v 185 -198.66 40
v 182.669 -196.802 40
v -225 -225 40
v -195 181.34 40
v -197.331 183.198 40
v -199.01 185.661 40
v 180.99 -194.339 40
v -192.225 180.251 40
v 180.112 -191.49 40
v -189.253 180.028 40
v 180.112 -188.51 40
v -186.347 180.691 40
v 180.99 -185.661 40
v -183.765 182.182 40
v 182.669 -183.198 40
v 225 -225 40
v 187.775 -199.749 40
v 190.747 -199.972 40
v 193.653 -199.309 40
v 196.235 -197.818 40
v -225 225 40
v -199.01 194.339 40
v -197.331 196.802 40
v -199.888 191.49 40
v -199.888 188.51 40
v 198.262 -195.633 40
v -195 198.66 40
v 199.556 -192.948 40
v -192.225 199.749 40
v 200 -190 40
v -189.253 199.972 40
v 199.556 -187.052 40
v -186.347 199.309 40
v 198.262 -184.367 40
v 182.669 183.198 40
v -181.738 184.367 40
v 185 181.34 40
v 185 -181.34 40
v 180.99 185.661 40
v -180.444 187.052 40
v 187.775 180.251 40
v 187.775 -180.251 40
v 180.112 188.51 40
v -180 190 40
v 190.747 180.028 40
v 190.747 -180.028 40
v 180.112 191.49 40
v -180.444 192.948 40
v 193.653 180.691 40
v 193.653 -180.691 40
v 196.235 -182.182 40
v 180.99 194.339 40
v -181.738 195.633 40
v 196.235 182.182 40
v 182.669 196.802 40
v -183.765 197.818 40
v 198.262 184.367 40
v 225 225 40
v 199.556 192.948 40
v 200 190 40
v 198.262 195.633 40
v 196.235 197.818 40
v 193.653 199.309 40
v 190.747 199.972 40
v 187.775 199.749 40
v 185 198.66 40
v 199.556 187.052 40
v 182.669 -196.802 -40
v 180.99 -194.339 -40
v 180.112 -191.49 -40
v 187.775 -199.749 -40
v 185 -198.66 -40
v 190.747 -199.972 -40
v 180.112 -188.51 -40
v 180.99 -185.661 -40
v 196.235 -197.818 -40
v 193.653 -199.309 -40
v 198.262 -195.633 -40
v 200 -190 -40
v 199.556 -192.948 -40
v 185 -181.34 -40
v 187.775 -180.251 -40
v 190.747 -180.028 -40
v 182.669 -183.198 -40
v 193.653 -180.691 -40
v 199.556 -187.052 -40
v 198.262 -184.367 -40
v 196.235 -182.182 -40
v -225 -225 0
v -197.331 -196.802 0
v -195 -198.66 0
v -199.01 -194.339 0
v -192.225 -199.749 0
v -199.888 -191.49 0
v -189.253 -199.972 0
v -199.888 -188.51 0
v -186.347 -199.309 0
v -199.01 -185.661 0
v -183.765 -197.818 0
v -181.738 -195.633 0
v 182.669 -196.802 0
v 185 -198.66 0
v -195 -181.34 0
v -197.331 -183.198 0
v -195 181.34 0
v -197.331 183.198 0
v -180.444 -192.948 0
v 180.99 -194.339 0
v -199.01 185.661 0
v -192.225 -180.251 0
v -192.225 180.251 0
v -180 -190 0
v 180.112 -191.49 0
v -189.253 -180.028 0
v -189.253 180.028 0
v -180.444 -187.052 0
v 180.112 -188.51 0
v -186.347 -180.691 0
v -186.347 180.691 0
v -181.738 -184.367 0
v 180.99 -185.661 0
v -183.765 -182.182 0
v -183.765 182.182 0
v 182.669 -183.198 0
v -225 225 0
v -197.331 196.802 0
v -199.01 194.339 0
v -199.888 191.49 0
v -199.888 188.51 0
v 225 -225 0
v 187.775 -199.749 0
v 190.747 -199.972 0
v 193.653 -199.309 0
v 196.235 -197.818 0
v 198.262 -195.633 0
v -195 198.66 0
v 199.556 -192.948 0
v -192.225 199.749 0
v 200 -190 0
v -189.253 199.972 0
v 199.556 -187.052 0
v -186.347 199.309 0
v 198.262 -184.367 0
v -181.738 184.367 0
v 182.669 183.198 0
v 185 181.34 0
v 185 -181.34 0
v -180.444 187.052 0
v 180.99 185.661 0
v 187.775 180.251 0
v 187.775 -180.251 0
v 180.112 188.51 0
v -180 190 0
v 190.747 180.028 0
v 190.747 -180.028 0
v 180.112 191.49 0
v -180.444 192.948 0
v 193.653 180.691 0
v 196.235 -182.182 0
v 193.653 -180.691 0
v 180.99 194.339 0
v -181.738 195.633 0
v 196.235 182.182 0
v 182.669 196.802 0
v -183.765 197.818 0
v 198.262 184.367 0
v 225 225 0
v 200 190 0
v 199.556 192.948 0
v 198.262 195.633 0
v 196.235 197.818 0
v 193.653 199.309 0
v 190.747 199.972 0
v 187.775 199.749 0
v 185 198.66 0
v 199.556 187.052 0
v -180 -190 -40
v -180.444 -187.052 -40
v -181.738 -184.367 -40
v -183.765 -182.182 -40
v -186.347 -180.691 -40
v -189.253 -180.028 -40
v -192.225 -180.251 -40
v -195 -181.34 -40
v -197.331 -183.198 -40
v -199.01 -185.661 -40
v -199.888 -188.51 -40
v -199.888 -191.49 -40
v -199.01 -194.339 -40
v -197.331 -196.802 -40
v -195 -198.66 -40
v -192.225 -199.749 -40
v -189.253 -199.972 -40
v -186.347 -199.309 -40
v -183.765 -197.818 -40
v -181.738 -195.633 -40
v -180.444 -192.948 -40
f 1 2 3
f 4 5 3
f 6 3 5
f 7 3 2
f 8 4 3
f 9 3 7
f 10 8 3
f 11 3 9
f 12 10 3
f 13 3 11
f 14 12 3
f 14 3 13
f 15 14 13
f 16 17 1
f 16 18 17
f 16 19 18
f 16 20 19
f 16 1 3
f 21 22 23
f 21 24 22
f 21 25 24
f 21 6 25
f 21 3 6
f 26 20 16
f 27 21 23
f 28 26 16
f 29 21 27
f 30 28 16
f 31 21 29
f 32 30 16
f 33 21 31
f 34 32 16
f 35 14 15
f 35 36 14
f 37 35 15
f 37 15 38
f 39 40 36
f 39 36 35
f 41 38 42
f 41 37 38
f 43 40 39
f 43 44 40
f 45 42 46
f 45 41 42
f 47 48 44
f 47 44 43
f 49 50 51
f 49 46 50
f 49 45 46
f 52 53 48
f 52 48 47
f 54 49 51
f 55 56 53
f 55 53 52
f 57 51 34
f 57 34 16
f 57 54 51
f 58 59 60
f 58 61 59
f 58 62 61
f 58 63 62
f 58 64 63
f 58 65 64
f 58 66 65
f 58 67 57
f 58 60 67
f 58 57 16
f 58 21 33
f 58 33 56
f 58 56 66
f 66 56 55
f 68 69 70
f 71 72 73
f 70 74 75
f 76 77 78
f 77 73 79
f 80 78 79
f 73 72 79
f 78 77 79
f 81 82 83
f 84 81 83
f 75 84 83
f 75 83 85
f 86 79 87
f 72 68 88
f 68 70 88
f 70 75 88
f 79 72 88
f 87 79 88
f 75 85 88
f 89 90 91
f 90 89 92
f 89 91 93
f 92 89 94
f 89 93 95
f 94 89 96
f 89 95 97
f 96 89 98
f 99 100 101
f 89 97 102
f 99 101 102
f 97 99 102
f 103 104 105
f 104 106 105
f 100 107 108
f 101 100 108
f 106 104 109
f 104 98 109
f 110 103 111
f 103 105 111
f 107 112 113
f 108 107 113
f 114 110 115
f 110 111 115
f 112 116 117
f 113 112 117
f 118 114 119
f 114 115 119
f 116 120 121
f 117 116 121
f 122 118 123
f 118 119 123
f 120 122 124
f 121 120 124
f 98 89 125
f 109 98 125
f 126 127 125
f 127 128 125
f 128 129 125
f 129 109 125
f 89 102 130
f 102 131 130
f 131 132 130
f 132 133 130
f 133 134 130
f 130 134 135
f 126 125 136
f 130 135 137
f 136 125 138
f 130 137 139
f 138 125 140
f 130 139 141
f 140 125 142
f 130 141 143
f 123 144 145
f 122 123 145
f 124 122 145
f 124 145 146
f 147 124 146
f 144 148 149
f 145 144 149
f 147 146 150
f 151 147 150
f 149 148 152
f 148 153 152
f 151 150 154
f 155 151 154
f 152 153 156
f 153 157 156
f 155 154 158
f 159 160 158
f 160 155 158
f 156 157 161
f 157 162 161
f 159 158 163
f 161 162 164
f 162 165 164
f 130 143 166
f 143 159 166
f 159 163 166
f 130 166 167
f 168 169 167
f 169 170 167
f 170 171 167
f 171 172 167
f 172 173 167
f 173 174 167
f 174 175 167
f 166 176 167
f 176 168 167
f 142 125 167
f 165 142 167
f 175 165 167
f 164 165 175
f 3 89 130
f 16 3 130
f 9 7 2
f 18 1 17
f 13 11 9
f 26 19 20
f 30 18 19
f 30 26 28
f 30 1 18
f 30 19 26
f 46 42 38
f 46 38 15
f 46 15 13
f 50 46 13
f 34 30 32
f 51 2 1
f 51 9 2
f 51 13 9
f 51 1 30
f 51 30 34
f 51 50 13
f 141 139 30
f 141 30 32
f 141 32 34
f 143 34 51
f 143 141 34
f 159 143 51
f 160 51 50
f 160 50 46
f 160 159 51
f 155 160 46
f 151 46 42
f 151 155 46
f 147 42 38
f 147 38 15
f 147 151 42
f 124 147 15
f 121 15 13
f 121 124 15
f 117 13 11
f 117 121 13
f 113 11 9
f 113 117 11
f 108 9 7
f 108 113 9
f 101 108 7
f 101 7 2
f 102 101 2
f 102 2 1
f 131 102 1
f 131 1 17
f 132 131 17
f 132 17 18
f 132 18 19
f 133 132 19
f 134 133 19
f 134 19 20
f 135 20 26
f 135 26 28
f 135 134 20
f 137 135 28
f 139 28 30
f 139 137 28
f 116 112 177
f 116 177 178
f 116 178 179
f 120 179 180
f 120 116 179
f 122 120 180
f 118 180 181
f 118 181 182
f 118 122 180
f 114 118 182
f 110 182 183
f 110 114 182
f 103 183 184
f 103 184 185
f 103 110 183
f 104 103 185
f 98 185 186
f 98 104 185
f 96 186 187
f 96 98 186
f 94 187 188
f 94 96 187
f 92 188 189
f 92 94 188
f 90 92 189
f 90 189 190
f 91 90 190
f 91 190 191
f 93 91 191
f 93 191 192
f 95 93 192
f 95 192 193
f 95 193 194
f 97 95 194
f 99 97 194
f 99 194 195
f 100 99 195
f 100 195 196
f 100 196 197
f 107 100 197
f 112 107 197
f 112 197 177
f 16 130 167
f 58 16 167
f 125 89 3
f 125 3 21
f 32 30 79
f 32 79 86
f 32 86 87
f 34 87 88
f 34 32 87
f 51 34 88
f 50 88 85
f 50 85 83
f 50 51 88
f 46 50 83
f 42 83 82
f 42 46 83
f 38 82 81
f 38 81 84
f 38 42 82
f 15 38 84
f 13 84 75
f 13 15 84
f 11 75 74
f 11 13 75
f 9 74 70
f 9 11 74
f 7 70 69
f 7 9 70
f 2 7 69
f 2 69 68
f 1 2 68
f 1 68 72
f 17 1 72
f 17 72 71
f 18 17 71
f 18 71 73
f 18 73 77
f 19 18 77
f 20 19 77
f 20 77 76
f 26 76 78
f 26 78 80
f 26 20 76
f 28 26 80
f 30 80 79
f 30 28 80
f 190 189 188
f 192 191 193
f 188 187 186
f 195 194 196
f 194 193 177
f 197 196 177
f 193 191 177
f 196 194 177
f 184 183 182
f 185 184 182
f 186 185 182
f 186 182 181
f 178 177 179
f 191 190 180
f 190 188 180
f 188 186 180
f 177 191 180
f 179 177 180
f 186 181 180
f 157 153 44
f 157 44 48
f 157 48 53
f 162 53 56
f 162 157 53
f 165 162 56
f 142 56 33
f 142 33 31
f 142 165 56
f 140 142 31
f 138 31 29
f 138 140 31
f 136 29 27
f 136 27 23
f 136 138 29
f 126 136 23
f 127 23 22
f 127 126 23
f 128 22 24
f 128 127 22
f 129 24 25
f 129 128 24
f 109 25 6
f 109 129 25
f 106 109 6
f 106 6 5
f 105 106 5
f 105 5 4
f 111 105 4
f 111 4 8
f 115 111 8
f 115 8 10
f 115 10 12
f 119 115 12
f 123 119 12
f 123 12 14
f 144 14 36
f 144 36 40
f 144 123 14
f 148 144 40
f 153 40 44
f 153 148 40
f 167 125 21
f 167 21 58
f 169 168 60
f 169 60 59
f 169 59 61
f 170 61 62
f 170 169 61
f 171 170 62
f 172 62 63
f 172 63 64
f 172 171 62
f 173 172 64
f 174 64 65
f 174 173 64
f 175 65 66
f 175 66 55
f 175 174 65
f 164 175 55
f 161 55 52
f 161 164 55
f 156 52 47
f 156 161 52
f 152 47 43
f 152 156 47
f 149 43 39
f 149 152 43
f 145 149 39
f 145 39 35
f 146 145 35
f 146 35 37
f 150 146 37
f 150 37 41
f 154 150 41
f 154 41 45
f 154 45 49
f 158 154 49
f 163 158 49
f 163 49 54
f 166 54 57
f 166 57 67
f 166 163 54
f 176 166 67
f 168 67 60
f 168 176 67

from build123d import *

# Parameters (mm, degrees)
F1_W     = 450
F1_H     = 450
F1_R     = 10
F2_DEPTH = 40
F3_R     = 10
F4_DEPTH = 80
F5_DEPTH = 80


with BuildPart() as f2:
    # F1 (on face) → F2 (new body)
    with BuildSketch(Plane.XY):
        Rectangle(F1_W, F1_H)
        with Locations((-190, -190)):
            Circle(F1_R, mode=Mode.SUBTRACT)
        with Locations((190, -190)):
            Circle(F1_R, mode=Mode.SUBTRACT)
        with Locations((-190, 190)):
            Circle(F1_R, mode=Mode.SUBTRACT)
        with Locations((190, 190)):
            Circle(F1_R, mode=Mode.SUBTRACT)
    extrude(amount=F2_DEPTH)

    # F3 (on face) → F4 (join)
    with BuildSketch(Plane.XY.offset(40)):
        with Locations((-190, -190)):
            Circle(F3_R)
    extrude(amount=-F4_DEPTH)


with BuildPart() as f5:
    # F3 (on face) → F5 (new body)
    with BuildSketch(Plane.XY.offset(40)):
        with Locations((190, -190)):
            Circle(F3_R)
    extrude(amount=-F5_DEPTH)


solid = Compound([f2.part, f5.part])
